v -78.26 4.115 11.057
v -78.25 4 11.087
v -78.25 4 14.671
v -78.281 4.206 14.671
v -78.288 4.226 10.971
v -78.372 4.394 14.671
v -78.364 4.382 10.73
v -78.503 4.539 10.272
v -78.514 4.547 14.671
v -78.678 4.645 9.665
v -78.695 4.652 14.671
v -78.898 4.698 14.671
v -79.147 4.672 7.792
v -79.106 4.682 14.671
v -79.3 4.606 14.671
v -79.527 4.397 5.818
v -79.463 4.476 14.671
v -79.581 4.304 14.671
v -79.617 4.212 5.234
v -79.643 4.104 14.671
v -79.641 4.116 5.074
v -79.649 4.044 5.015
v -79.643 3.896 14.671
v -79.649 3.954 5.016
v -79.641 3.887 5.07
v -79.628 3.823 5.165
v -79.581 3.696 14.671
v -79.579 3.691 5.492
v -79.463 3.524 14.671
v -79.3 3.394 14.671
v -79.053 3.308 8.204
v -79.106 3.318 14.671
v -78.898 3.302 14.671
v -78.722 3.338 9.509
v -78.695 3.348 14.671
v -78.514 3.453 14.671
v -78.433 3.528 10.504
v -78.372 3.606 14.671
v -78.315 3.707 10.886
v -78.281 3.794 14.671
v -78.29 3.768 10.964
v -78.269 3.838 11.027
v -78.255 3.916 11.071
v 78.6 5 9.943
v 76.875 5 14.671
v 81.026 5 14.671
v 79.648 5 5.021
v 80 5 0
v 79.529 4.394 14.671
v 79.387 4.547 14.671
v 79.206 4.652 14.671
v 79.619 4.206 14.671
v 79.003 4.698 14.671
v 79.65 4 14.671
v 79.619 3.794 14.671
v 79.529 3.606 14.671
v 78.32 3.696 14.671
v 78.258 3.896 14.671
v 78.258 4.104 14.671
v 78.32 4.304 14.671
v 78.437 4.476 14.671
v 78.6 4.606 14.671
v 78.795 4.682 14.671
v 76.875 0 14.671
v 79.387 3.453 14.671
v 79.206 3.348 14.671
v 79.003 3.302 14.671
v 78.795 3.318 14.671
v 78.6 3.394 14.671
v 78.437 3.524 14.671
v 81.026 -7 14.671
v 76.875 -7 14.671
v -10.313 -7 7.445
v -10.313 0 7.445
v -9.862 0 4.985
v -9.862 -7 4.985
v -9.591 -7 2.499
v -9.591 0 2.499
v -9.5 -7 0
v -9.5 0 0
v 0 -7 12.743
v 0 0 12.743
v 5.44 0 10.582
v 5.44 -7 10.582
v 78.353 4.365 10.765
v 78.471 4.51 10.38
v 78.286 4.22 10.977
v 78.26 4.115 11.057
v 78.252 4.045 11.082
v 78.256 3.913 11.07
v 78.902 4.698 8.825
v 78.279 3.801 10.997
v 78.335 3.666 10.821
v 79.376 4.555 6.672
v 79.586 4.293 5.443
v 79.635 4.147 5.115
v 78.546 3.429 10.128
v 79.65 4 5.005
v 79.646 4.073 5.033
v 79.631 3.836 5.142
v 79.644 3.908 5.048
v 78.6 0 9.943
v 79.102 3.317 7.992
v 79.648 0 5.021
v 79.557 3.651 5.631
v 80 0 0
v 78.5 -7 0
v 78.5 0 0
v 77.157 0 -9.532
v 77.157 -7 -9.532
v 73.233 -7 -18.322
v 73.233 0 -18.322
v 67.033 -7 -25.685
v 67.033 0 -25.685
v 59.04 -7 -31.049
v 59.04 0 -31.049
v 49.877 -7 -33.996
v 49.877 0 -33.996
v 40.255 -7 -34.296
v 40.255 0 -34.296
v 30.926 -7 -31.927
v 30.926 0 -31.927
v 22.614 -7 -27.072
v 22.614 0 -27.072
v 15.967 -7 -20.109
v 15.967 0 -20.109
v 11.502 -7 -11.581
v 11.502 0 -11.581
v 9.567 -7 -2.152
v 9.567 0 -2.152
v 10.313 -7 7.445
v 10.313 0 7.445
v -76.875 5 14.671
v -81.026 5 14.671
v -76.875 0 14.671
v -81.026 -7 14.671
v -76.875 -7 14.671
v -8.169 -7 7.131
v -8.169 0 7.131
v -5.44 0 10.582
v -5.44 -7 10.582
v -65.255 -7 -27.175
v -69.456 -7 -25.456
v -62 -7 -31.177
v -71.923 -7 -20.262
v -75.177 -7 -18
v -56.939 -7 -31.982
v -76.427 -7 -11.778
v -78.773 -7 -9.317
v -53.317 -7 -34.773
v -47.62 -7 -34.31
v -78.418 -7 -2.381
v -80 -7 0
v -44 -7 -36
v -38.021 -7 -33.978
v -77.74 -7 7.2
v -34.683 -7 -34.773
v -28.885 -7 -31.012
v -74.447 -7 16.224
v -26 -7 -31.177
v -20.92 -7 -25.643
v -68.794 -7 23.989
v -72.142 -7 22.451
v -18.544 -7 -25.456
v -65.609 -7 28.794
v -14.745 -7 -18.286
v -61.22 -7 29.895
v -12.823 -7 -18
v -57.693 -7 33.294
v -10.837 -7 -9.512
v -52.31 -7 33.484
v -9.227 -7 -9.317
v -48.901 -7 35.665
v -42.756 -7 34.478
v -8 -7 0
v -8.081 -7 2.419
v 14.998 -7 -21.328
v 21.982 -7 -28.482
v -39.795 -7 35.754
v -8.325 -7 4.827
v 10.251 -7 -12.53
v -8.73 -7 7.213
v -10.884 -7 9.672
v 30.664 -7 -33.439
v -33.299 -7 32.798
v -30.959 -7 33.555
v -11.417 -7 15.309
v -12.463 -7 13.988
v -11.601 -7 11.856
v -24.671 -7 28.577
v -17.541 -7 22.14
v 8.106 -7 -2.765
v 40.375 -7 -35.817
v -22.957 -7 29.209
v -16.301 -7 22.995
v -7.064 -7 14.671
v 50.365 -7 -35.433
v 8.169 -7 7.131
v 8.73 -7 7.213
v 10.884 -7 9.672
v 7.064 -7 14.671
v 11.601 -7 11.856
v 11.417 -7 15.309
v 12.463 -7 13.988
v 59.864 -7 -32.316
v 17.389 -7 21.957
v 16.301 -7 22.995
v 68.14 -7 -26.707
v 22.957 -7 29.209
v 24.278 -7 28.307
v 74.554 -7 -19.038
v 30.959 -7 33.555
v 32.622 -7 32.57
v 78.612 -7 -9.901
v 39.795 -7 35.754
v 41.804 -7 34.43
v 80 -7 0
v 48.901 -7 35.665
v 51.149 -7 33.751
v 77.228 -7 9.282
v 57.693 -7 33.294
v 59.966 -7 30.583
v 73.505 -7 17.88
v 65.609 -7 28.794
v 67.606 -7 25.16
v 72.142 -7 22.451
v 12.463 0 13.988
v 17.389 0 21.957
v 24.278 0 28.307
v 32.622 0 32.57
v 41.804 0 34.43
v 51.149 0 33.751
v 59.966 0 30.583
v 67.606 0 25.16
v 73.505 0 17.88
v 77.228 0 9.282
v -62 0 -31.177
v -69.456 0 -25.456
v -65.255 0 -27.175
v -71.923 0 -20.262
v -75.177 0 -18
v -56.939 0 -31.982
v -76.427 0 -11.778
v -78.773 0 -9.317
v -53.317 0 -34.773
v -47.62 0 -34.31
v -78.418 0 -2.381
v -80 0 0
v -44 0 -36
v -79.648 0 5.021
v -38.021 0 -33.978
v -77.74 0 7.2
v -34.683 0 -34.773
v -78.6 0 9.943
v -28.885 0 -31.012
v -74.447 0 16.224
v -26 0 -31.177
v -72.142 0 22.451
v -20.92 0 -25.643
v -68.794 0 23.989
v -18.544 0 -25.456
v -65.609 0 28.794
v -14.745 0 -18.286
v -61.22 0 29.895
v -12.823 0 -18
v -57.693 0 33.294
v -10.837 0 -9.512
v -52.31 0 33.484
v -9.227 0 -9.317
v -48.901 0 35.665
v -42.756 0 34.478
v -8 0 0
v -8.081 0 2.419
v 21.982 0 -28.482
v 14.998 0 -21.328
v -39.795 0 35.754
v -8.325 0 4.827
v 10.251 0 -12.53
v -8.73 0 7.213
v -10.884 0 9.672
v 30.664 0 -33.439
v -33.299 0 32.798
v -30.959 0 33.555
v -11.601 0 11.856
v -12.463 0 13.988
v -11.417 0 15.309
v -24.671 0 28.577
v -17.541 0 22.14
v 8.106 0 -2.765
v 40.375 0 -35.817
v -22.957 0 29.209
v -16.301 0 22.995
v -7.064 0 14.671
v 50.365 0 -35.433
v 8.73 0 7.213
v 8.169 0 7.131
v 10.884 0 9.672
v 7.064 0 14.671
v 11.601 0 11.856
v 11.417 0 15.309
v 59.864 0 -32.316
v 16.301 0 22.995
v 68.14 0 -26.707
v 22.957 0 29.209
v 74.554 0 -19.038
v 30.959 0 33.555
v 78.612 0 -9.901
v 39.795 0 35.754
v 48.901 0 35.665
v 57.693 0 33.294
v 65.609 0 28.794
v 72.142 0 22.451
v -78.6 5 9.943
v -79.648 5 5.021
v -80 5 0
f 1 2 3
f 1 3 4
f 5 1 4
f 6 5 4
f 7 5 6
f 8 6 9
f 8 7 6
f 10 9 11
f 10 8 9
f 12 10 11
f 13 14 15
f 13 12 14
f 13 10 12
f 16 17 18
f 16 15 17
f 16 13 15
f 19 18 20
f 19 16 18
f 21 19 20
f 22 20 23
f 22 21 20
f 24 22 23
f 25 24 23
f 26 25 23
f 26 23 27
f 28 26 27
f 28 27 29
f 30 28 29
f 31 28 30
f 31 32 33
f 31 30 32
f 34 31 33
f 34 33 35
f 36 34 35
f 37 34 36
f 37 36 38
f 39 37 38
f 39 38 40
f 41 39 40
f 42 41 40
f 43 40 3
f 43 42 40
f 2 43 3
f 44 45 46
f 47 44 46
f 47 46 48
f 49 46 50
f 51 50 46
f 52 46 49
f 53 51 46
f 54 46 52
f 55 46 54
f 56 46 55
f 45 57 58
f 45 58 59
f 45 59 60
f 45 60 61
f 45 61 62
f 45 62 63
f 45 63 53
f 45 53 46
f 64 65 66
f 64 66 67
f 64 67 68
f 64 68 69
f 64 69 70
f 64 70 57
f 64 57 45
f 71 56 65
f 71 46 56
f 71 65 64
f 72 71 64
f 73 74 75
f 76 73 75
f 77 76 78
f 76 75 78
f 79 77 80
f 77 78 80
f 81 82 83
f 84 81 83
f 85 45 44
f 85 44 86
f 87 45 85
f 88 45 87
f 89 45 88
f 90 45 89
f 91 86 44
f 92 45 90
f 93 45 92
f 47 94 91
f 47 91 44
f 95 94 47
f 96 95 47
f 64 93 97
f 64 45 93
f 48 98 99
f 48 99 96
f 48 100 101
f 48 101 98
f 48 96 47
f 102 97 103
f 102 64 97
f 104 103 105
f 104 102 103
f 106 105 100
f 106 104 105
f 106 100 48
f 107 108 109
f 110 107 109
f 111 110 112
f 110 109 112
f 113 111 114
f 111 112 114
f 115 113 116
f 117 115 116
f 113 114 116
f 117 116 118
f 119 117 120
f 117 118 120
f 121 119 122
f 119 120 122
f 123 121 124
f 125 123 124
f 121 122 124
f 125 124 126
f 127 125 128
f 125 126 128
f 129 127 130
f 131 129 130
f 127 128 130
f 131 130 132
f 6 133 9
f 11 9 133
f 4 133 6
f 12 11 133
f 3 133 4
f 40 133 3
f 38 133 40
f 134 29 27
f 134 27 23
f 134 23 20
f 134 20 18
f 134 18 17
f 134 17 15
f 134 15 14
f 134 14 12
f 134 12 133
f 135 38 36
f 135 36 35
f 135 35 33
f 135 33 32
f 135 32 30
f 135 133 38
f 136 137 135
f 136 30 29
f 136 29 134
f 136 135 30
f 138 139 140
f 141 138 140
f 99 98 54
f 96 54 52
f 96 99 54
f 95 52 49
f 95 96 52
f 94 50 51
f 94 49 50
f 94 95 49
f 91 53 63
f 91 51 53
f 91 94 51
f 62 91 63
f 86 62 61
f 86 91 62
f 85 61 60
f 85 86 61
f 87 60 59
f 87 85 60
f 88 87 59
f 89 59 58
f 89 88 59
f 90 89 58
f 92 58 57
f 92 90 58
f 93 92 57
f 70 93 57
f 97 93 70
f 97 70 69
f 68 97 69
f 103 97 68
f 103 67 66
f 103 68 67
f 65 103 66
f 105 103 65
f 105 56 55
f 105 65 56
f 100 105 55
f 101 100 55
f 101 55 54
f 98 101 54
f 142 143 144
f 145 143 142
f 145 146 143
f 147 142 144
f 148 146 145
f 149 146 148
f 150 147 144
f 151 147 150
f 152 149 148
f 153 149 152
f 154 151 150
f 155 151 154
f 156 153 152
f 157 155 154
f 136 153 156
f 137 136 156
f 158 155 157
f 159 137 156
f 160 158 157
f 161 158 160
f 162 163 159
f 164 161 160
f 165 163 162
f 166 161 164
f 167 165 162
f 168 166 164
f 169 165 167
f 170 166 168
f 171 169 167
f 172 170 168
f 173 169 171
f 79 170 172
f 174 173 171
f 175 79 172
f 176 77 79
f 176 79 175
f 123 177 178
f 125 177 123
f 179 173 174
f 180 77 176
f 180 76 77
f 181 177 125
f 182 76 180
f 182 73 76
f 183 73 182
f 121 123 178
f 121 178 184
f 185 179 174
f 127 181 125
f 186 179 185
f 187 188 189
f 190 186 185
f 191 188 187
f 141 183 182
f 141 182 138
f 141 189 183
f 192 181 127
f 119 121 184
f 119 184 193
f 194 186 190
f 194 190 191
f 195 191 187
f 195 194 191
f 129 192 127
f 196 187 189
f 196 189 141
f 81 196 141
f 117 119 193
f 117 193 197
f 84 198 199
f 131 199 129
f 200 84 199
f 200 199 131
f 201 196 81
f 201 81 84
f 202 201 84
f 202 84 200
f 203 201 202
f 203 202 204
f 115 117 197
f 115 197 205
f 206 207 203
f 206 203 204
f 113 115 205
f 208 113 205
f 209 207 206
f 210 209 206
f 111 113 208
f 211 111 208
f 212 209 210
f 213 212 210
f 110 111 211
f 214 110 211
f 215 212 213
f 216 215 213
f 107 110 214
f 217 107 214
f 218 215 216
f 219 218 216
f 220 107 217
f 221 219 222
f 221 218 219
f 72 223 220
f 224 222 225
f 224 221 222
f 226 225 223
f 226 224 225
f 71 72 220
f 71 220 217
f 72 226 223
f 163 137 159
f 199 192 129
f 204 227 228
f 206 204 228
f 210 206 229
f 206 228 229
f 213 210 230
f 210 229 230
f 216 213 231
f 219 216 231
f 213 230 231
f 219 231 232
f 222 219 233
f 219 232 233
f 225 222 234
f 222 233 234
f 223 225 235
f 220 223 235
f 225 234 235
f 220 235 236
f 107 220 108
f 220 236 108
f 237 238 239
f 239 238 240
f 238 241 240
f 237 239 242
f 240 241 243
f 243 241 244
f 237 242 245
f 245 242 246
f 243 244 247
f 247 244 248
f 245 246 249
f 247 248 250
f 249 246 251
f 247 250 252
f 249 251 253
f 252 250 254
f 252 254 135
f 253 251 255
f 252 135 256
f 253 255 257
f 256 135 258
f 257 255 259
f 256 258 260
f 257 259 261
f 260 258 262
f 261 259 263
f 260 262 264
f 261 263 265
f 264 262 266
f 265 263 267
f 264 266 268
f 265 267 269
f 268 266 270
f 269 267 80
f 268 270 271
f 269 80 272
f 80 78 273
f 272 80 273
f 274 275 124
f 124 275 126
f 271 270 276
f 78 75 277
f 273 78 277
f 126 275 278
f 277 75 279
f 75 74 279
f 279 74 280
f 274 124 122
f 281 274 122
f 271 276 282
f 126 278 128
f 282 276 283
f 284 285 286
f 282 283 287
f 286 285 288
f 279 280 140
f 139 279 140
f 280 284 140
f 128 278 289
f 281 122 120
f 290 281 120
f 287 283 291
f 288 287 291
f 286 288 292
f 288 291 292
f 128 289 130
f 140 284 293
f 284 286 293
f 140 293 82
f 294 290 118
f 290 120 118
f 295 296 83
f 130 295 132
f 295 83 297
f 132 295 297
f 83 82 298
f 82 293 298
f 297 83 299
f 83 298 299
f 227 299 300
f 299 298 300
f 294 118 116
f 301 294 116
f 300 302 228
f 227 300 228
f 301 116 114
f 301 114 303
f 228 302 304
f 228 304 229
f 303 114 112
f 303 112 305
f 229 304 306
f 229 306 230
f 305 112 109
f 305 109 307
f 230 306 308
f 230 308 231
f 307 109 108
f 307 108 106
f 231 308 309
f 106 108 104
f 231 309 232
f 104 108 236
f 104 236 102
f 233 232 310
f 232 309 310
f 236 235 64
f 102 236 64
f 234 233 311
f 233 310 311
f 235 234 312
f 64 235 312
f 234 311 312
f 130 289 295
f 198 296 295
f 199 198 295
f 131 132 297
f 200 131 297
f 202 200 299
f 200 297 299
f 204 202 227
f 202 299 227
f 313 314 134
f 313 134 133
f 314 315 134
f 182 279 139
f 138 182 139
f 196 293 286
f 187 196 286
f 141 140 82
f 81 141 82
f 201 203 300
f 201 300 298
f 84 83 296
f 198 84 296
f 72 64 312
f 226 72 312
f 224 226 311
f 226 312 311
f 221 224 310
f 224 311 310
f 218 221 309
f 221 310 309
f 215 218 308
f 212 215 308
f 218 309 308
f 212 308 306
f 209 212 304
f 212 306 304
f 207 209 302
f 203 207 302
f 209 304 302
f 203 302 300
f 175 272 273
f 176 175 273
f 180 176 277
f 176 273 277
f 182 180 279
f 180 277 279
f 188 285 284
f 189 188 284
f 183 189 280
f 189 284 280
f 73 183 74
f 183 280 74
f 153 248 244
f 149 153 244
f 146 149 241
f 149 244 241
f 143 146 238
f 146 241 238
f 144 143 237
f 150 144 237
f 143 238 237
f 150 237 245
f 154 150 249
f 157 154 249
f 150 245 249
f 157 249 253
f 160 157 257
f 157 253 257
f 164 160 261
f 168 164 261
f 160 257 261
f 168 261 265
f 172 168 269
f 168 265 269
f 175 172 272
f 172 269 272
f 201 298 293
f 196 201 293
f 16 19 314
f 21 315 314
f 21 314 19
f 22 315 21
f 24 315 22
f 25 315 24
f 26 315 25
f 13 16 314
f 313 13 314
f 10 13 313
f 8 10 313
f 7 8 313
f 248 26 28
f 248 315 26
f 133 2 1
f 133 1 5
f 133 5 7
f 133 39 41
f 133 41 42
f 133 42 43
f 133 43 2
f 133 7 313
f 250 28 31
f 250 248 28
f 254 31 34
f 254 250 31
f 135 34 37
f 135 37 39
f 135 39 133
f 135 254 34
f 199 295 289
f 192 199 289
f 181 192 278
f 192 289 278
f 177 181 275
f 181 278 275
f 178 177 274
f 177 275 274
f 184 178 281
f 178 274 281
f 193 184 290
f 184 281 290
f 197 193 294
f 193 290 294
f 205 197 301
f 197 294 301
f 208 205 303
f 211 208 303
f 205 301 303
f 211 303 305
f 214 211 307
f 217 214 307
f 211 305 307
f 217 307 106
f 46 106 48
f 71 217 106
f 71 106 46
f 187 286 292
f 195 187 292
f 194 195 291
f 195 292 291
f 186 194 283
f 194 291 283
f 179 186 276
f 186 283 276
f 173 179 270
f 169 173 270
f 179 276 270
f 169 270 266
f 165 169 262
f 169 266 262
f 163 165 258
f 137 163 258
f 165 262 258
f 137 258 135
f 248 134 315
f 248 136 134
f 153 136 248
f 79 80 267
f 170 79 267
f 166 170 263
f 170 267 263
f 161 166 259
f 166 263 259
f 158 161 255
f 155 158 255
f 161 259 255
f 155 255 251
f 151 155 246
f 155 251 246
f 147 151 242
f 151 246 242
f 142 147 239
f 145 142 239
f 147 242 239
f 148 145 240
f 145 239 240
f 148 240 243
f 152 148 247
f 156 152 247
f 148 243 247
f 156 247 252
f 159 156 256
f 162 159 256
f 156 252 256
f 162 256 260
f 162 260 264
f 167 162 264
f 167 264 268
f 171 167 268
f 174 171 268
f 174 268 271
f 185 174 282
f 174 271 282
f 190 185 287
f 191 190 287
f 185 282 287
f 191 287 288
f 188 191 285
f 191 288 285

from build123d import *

# Parameters (mm, degrees)
F1_DEPTH = 7
F2_DEPTH = 5
F3_R     = 0.7
F4_DEPTH = 36.001


# Not quite as in the source:
# - a feature names something its author has since deleted; it is built from what else it names


with BuildPart() as f1:
    # F0 (on Front) → F1 (new body)
    with BuildSketch(Plane.XZ):
        with BuildLine():
            ThreePointArc((76.8747497611, 14.6714289741), (44.3508342177, 35.9982904504), (11.4174388077, 15.3093666149))
            Line((11.4174388077, 15.3093666149), (12.4627336019, 13.9875240173))
            ThreePointArc((12.4627336019, 13.9875240173), (51.1489268169, 33.7511902807), (78.5, 0))
            ThreePointArc((78.5, 0), (40.255323539, -34.2961717718), (10.312904452, 7.4451053411))
            Line((10.312904452, 7.4451053411), (8.7300367759, 7.2131611772))
            ThreePointArc((8.7300367759, 7.2131611772), (40.3749949013, -35.8170258122), (80, 0))
            ThreePointArc((80, 0), (79.2100198197, 7.5003002806), (76.8747497611, 14.6714289741))
        make_face()
        with BuildLine():
            ThreePointArc((-10.312904452, 7.4451053411), (-9.7038282282, 3.744676461), (-9.5, 0))
            ThreePointArc((-9.5, 0), (-77.7511902807, -7.1489268169), (-12.4627336019, 13.9875240173))
            Line((-12.4627336019, 13.9875240173), (-11.4174388077, 15.3093666149))
            ThreePointArc((-11.4174388077, 15.3093666149), (-44.3508342177, 35.9982904504), (-76.8747497611, 14.6714289741))
            ThreePointArc((-76.8747497611, 14.6714289741), (-79.2100198197, 7.5003002806), (-80, 0))
            ThreePointArc((-80, 0), (-44, -36), (-8, 0))
            ThreePointArc((-8, 0), (-8.1829741878, 3.6250050987), (-8.7300367759, 7.2131611772))
            Line((-8.7300367759, 7.2131611772), (-10.312904452, 7.4451053411))
        make_face()
        with BuildLine():
            ThreePointArc((-12.4627336019, 13.9875240173), (-11.2241680754, 10.7700901411), (-10.312904452, 7.4451053411))
            Line((-10.312904452, 7.4451053411), (-8.7300367759, 7.2131611772))
            ThreePointArc((-8.7300367759, 7.2131611772), (-9.8330802816, 11.3411461924), (-11.4174388077, 15.3093666149))
            Line((-11.4174388077, 15.3093666149), (-12.4627336019, 13.9875240173))
        make_face()
        with BuildLine():
            ThreePointArc((-11.4174388077, 15.3093666149), (-9.8330802816, 11.3411461924), (-8.7300367759, 7.2131611772))
            Line((-8.7300367759, 7.2131611772), (-8.1688707932, 7.1309311988))
            Line((-8.1688707932, 7.1309311988), (-5.43964638, 10.5822112661))
            Line((-5.43964638, 10.5822112661), (-7.0639303873, 14.6714289741))
            Line((-7.0639303873, 14.6714289741), (-11.4174388077, 15.3093666149))
        make_face()
        Polygon((0, 14.6714289741), (-7.0639303873, 14.6714289741), (-5.43964638, 10.5822112661), (0, 12.7429009753), (5.43964638, 10.5822112661), (7.0639303873, 14.6714289741), align=None)
        with BuildLine():
            Line((11.4174388077, 15.3093666149), (7.0639303873, 14.6714289741))
            Line((7.0639303873, 14.6714289741), (5.43964638, 10.5822112661))
            Line((5.43964638, 10.5822112661), (8.1688707932, 7.1309311988))
            Line((8.1688707932, 7.1309311988), (8.7300367759, 7.2131611772))
            ThreePointArc((8.7300367759, 7.2131611772), (9.8330802816, 11.3411461924), (11.4174388077, 15.3093666149))
        make_face()
        with BuildLine():
            Line((12.4627336019, 13.9875240173), (11.4174388077, 15.3093666149))
            ThreePointArc((11.4174388077, 15.3093666149), (9.8330802816, 11.3411461924), (8.7300367759, 7.2131611772))
            Line((8.7300367759, 7.2131611772), (10.312904452, 7.4451053411))
            ThreePointArc((10.312904452, 7.4451053411), (11.2241680754, 10.7700901411), (12.4627336019, 13.9875240173))
        make_face()
        with BuildLine():
            Line((81.0259262548, 14.6714289741), (76.8747497611, 14.6714289741))
            ThreePointArc((76.8747497611, 14.6714289741), (79.2100198197, 7.5003002806), (80, 0))
            Line((80, 0), (81.0259262548, 14.6714289741))
        make_face()
        with BuildLine():
            ThreePointArc((-80, 0), (-79.2100198197, 7.5003002806), (-76.8747497611, 14.6714289741))
            Line((-76.8747497611, 14.6714289741), (-81.0259262548, 14.6714289741))
            Line((-81.0259262548, 14.6714289741), (-80, 0))
        make_face()
    extrude(amount=F1_DEPTH)

    # F0 (on Front) → F2 (join)
    with BuildSketch(Plane.XZ):
        with BuildLine():
            ThreePointArc((-80, 0), (-79.2100198197, 7.5003002806), (-76.8747497611, 14.6714289741))
            Line((-76.8747497611, 14.6714289741), (-81.0259262548, 14.6714289741))
            Line((-81.0259262548, 14.6714289741), (-80, 0))
        make_face()
        with BuildLine():
            Line((81.0259262548, 14.6714289741), (76.8747497611, 14.6714289741))
            ThreePointArc((76.8747497611, 14.6714289741), (79.2100198197, 7.5003002806), (80, 0))
            Line((80, 0), (81.0259262548, 14.6714289741))
        make_face()
    extrude(amount=-F2_DEPTH)

    # F3 (on Top) → F4 (cut, through all)
    with BuildSketch(Plane.XY):
        with Locations((-78.950338008, 4)):
            Circle(F3_R)
        with Locations((78.950338008, 4)):
            Circle(F3_R)
    extrude(amount=F4_DEPTH, mode=Mode.SUBTRACT)


solid = f1.part
